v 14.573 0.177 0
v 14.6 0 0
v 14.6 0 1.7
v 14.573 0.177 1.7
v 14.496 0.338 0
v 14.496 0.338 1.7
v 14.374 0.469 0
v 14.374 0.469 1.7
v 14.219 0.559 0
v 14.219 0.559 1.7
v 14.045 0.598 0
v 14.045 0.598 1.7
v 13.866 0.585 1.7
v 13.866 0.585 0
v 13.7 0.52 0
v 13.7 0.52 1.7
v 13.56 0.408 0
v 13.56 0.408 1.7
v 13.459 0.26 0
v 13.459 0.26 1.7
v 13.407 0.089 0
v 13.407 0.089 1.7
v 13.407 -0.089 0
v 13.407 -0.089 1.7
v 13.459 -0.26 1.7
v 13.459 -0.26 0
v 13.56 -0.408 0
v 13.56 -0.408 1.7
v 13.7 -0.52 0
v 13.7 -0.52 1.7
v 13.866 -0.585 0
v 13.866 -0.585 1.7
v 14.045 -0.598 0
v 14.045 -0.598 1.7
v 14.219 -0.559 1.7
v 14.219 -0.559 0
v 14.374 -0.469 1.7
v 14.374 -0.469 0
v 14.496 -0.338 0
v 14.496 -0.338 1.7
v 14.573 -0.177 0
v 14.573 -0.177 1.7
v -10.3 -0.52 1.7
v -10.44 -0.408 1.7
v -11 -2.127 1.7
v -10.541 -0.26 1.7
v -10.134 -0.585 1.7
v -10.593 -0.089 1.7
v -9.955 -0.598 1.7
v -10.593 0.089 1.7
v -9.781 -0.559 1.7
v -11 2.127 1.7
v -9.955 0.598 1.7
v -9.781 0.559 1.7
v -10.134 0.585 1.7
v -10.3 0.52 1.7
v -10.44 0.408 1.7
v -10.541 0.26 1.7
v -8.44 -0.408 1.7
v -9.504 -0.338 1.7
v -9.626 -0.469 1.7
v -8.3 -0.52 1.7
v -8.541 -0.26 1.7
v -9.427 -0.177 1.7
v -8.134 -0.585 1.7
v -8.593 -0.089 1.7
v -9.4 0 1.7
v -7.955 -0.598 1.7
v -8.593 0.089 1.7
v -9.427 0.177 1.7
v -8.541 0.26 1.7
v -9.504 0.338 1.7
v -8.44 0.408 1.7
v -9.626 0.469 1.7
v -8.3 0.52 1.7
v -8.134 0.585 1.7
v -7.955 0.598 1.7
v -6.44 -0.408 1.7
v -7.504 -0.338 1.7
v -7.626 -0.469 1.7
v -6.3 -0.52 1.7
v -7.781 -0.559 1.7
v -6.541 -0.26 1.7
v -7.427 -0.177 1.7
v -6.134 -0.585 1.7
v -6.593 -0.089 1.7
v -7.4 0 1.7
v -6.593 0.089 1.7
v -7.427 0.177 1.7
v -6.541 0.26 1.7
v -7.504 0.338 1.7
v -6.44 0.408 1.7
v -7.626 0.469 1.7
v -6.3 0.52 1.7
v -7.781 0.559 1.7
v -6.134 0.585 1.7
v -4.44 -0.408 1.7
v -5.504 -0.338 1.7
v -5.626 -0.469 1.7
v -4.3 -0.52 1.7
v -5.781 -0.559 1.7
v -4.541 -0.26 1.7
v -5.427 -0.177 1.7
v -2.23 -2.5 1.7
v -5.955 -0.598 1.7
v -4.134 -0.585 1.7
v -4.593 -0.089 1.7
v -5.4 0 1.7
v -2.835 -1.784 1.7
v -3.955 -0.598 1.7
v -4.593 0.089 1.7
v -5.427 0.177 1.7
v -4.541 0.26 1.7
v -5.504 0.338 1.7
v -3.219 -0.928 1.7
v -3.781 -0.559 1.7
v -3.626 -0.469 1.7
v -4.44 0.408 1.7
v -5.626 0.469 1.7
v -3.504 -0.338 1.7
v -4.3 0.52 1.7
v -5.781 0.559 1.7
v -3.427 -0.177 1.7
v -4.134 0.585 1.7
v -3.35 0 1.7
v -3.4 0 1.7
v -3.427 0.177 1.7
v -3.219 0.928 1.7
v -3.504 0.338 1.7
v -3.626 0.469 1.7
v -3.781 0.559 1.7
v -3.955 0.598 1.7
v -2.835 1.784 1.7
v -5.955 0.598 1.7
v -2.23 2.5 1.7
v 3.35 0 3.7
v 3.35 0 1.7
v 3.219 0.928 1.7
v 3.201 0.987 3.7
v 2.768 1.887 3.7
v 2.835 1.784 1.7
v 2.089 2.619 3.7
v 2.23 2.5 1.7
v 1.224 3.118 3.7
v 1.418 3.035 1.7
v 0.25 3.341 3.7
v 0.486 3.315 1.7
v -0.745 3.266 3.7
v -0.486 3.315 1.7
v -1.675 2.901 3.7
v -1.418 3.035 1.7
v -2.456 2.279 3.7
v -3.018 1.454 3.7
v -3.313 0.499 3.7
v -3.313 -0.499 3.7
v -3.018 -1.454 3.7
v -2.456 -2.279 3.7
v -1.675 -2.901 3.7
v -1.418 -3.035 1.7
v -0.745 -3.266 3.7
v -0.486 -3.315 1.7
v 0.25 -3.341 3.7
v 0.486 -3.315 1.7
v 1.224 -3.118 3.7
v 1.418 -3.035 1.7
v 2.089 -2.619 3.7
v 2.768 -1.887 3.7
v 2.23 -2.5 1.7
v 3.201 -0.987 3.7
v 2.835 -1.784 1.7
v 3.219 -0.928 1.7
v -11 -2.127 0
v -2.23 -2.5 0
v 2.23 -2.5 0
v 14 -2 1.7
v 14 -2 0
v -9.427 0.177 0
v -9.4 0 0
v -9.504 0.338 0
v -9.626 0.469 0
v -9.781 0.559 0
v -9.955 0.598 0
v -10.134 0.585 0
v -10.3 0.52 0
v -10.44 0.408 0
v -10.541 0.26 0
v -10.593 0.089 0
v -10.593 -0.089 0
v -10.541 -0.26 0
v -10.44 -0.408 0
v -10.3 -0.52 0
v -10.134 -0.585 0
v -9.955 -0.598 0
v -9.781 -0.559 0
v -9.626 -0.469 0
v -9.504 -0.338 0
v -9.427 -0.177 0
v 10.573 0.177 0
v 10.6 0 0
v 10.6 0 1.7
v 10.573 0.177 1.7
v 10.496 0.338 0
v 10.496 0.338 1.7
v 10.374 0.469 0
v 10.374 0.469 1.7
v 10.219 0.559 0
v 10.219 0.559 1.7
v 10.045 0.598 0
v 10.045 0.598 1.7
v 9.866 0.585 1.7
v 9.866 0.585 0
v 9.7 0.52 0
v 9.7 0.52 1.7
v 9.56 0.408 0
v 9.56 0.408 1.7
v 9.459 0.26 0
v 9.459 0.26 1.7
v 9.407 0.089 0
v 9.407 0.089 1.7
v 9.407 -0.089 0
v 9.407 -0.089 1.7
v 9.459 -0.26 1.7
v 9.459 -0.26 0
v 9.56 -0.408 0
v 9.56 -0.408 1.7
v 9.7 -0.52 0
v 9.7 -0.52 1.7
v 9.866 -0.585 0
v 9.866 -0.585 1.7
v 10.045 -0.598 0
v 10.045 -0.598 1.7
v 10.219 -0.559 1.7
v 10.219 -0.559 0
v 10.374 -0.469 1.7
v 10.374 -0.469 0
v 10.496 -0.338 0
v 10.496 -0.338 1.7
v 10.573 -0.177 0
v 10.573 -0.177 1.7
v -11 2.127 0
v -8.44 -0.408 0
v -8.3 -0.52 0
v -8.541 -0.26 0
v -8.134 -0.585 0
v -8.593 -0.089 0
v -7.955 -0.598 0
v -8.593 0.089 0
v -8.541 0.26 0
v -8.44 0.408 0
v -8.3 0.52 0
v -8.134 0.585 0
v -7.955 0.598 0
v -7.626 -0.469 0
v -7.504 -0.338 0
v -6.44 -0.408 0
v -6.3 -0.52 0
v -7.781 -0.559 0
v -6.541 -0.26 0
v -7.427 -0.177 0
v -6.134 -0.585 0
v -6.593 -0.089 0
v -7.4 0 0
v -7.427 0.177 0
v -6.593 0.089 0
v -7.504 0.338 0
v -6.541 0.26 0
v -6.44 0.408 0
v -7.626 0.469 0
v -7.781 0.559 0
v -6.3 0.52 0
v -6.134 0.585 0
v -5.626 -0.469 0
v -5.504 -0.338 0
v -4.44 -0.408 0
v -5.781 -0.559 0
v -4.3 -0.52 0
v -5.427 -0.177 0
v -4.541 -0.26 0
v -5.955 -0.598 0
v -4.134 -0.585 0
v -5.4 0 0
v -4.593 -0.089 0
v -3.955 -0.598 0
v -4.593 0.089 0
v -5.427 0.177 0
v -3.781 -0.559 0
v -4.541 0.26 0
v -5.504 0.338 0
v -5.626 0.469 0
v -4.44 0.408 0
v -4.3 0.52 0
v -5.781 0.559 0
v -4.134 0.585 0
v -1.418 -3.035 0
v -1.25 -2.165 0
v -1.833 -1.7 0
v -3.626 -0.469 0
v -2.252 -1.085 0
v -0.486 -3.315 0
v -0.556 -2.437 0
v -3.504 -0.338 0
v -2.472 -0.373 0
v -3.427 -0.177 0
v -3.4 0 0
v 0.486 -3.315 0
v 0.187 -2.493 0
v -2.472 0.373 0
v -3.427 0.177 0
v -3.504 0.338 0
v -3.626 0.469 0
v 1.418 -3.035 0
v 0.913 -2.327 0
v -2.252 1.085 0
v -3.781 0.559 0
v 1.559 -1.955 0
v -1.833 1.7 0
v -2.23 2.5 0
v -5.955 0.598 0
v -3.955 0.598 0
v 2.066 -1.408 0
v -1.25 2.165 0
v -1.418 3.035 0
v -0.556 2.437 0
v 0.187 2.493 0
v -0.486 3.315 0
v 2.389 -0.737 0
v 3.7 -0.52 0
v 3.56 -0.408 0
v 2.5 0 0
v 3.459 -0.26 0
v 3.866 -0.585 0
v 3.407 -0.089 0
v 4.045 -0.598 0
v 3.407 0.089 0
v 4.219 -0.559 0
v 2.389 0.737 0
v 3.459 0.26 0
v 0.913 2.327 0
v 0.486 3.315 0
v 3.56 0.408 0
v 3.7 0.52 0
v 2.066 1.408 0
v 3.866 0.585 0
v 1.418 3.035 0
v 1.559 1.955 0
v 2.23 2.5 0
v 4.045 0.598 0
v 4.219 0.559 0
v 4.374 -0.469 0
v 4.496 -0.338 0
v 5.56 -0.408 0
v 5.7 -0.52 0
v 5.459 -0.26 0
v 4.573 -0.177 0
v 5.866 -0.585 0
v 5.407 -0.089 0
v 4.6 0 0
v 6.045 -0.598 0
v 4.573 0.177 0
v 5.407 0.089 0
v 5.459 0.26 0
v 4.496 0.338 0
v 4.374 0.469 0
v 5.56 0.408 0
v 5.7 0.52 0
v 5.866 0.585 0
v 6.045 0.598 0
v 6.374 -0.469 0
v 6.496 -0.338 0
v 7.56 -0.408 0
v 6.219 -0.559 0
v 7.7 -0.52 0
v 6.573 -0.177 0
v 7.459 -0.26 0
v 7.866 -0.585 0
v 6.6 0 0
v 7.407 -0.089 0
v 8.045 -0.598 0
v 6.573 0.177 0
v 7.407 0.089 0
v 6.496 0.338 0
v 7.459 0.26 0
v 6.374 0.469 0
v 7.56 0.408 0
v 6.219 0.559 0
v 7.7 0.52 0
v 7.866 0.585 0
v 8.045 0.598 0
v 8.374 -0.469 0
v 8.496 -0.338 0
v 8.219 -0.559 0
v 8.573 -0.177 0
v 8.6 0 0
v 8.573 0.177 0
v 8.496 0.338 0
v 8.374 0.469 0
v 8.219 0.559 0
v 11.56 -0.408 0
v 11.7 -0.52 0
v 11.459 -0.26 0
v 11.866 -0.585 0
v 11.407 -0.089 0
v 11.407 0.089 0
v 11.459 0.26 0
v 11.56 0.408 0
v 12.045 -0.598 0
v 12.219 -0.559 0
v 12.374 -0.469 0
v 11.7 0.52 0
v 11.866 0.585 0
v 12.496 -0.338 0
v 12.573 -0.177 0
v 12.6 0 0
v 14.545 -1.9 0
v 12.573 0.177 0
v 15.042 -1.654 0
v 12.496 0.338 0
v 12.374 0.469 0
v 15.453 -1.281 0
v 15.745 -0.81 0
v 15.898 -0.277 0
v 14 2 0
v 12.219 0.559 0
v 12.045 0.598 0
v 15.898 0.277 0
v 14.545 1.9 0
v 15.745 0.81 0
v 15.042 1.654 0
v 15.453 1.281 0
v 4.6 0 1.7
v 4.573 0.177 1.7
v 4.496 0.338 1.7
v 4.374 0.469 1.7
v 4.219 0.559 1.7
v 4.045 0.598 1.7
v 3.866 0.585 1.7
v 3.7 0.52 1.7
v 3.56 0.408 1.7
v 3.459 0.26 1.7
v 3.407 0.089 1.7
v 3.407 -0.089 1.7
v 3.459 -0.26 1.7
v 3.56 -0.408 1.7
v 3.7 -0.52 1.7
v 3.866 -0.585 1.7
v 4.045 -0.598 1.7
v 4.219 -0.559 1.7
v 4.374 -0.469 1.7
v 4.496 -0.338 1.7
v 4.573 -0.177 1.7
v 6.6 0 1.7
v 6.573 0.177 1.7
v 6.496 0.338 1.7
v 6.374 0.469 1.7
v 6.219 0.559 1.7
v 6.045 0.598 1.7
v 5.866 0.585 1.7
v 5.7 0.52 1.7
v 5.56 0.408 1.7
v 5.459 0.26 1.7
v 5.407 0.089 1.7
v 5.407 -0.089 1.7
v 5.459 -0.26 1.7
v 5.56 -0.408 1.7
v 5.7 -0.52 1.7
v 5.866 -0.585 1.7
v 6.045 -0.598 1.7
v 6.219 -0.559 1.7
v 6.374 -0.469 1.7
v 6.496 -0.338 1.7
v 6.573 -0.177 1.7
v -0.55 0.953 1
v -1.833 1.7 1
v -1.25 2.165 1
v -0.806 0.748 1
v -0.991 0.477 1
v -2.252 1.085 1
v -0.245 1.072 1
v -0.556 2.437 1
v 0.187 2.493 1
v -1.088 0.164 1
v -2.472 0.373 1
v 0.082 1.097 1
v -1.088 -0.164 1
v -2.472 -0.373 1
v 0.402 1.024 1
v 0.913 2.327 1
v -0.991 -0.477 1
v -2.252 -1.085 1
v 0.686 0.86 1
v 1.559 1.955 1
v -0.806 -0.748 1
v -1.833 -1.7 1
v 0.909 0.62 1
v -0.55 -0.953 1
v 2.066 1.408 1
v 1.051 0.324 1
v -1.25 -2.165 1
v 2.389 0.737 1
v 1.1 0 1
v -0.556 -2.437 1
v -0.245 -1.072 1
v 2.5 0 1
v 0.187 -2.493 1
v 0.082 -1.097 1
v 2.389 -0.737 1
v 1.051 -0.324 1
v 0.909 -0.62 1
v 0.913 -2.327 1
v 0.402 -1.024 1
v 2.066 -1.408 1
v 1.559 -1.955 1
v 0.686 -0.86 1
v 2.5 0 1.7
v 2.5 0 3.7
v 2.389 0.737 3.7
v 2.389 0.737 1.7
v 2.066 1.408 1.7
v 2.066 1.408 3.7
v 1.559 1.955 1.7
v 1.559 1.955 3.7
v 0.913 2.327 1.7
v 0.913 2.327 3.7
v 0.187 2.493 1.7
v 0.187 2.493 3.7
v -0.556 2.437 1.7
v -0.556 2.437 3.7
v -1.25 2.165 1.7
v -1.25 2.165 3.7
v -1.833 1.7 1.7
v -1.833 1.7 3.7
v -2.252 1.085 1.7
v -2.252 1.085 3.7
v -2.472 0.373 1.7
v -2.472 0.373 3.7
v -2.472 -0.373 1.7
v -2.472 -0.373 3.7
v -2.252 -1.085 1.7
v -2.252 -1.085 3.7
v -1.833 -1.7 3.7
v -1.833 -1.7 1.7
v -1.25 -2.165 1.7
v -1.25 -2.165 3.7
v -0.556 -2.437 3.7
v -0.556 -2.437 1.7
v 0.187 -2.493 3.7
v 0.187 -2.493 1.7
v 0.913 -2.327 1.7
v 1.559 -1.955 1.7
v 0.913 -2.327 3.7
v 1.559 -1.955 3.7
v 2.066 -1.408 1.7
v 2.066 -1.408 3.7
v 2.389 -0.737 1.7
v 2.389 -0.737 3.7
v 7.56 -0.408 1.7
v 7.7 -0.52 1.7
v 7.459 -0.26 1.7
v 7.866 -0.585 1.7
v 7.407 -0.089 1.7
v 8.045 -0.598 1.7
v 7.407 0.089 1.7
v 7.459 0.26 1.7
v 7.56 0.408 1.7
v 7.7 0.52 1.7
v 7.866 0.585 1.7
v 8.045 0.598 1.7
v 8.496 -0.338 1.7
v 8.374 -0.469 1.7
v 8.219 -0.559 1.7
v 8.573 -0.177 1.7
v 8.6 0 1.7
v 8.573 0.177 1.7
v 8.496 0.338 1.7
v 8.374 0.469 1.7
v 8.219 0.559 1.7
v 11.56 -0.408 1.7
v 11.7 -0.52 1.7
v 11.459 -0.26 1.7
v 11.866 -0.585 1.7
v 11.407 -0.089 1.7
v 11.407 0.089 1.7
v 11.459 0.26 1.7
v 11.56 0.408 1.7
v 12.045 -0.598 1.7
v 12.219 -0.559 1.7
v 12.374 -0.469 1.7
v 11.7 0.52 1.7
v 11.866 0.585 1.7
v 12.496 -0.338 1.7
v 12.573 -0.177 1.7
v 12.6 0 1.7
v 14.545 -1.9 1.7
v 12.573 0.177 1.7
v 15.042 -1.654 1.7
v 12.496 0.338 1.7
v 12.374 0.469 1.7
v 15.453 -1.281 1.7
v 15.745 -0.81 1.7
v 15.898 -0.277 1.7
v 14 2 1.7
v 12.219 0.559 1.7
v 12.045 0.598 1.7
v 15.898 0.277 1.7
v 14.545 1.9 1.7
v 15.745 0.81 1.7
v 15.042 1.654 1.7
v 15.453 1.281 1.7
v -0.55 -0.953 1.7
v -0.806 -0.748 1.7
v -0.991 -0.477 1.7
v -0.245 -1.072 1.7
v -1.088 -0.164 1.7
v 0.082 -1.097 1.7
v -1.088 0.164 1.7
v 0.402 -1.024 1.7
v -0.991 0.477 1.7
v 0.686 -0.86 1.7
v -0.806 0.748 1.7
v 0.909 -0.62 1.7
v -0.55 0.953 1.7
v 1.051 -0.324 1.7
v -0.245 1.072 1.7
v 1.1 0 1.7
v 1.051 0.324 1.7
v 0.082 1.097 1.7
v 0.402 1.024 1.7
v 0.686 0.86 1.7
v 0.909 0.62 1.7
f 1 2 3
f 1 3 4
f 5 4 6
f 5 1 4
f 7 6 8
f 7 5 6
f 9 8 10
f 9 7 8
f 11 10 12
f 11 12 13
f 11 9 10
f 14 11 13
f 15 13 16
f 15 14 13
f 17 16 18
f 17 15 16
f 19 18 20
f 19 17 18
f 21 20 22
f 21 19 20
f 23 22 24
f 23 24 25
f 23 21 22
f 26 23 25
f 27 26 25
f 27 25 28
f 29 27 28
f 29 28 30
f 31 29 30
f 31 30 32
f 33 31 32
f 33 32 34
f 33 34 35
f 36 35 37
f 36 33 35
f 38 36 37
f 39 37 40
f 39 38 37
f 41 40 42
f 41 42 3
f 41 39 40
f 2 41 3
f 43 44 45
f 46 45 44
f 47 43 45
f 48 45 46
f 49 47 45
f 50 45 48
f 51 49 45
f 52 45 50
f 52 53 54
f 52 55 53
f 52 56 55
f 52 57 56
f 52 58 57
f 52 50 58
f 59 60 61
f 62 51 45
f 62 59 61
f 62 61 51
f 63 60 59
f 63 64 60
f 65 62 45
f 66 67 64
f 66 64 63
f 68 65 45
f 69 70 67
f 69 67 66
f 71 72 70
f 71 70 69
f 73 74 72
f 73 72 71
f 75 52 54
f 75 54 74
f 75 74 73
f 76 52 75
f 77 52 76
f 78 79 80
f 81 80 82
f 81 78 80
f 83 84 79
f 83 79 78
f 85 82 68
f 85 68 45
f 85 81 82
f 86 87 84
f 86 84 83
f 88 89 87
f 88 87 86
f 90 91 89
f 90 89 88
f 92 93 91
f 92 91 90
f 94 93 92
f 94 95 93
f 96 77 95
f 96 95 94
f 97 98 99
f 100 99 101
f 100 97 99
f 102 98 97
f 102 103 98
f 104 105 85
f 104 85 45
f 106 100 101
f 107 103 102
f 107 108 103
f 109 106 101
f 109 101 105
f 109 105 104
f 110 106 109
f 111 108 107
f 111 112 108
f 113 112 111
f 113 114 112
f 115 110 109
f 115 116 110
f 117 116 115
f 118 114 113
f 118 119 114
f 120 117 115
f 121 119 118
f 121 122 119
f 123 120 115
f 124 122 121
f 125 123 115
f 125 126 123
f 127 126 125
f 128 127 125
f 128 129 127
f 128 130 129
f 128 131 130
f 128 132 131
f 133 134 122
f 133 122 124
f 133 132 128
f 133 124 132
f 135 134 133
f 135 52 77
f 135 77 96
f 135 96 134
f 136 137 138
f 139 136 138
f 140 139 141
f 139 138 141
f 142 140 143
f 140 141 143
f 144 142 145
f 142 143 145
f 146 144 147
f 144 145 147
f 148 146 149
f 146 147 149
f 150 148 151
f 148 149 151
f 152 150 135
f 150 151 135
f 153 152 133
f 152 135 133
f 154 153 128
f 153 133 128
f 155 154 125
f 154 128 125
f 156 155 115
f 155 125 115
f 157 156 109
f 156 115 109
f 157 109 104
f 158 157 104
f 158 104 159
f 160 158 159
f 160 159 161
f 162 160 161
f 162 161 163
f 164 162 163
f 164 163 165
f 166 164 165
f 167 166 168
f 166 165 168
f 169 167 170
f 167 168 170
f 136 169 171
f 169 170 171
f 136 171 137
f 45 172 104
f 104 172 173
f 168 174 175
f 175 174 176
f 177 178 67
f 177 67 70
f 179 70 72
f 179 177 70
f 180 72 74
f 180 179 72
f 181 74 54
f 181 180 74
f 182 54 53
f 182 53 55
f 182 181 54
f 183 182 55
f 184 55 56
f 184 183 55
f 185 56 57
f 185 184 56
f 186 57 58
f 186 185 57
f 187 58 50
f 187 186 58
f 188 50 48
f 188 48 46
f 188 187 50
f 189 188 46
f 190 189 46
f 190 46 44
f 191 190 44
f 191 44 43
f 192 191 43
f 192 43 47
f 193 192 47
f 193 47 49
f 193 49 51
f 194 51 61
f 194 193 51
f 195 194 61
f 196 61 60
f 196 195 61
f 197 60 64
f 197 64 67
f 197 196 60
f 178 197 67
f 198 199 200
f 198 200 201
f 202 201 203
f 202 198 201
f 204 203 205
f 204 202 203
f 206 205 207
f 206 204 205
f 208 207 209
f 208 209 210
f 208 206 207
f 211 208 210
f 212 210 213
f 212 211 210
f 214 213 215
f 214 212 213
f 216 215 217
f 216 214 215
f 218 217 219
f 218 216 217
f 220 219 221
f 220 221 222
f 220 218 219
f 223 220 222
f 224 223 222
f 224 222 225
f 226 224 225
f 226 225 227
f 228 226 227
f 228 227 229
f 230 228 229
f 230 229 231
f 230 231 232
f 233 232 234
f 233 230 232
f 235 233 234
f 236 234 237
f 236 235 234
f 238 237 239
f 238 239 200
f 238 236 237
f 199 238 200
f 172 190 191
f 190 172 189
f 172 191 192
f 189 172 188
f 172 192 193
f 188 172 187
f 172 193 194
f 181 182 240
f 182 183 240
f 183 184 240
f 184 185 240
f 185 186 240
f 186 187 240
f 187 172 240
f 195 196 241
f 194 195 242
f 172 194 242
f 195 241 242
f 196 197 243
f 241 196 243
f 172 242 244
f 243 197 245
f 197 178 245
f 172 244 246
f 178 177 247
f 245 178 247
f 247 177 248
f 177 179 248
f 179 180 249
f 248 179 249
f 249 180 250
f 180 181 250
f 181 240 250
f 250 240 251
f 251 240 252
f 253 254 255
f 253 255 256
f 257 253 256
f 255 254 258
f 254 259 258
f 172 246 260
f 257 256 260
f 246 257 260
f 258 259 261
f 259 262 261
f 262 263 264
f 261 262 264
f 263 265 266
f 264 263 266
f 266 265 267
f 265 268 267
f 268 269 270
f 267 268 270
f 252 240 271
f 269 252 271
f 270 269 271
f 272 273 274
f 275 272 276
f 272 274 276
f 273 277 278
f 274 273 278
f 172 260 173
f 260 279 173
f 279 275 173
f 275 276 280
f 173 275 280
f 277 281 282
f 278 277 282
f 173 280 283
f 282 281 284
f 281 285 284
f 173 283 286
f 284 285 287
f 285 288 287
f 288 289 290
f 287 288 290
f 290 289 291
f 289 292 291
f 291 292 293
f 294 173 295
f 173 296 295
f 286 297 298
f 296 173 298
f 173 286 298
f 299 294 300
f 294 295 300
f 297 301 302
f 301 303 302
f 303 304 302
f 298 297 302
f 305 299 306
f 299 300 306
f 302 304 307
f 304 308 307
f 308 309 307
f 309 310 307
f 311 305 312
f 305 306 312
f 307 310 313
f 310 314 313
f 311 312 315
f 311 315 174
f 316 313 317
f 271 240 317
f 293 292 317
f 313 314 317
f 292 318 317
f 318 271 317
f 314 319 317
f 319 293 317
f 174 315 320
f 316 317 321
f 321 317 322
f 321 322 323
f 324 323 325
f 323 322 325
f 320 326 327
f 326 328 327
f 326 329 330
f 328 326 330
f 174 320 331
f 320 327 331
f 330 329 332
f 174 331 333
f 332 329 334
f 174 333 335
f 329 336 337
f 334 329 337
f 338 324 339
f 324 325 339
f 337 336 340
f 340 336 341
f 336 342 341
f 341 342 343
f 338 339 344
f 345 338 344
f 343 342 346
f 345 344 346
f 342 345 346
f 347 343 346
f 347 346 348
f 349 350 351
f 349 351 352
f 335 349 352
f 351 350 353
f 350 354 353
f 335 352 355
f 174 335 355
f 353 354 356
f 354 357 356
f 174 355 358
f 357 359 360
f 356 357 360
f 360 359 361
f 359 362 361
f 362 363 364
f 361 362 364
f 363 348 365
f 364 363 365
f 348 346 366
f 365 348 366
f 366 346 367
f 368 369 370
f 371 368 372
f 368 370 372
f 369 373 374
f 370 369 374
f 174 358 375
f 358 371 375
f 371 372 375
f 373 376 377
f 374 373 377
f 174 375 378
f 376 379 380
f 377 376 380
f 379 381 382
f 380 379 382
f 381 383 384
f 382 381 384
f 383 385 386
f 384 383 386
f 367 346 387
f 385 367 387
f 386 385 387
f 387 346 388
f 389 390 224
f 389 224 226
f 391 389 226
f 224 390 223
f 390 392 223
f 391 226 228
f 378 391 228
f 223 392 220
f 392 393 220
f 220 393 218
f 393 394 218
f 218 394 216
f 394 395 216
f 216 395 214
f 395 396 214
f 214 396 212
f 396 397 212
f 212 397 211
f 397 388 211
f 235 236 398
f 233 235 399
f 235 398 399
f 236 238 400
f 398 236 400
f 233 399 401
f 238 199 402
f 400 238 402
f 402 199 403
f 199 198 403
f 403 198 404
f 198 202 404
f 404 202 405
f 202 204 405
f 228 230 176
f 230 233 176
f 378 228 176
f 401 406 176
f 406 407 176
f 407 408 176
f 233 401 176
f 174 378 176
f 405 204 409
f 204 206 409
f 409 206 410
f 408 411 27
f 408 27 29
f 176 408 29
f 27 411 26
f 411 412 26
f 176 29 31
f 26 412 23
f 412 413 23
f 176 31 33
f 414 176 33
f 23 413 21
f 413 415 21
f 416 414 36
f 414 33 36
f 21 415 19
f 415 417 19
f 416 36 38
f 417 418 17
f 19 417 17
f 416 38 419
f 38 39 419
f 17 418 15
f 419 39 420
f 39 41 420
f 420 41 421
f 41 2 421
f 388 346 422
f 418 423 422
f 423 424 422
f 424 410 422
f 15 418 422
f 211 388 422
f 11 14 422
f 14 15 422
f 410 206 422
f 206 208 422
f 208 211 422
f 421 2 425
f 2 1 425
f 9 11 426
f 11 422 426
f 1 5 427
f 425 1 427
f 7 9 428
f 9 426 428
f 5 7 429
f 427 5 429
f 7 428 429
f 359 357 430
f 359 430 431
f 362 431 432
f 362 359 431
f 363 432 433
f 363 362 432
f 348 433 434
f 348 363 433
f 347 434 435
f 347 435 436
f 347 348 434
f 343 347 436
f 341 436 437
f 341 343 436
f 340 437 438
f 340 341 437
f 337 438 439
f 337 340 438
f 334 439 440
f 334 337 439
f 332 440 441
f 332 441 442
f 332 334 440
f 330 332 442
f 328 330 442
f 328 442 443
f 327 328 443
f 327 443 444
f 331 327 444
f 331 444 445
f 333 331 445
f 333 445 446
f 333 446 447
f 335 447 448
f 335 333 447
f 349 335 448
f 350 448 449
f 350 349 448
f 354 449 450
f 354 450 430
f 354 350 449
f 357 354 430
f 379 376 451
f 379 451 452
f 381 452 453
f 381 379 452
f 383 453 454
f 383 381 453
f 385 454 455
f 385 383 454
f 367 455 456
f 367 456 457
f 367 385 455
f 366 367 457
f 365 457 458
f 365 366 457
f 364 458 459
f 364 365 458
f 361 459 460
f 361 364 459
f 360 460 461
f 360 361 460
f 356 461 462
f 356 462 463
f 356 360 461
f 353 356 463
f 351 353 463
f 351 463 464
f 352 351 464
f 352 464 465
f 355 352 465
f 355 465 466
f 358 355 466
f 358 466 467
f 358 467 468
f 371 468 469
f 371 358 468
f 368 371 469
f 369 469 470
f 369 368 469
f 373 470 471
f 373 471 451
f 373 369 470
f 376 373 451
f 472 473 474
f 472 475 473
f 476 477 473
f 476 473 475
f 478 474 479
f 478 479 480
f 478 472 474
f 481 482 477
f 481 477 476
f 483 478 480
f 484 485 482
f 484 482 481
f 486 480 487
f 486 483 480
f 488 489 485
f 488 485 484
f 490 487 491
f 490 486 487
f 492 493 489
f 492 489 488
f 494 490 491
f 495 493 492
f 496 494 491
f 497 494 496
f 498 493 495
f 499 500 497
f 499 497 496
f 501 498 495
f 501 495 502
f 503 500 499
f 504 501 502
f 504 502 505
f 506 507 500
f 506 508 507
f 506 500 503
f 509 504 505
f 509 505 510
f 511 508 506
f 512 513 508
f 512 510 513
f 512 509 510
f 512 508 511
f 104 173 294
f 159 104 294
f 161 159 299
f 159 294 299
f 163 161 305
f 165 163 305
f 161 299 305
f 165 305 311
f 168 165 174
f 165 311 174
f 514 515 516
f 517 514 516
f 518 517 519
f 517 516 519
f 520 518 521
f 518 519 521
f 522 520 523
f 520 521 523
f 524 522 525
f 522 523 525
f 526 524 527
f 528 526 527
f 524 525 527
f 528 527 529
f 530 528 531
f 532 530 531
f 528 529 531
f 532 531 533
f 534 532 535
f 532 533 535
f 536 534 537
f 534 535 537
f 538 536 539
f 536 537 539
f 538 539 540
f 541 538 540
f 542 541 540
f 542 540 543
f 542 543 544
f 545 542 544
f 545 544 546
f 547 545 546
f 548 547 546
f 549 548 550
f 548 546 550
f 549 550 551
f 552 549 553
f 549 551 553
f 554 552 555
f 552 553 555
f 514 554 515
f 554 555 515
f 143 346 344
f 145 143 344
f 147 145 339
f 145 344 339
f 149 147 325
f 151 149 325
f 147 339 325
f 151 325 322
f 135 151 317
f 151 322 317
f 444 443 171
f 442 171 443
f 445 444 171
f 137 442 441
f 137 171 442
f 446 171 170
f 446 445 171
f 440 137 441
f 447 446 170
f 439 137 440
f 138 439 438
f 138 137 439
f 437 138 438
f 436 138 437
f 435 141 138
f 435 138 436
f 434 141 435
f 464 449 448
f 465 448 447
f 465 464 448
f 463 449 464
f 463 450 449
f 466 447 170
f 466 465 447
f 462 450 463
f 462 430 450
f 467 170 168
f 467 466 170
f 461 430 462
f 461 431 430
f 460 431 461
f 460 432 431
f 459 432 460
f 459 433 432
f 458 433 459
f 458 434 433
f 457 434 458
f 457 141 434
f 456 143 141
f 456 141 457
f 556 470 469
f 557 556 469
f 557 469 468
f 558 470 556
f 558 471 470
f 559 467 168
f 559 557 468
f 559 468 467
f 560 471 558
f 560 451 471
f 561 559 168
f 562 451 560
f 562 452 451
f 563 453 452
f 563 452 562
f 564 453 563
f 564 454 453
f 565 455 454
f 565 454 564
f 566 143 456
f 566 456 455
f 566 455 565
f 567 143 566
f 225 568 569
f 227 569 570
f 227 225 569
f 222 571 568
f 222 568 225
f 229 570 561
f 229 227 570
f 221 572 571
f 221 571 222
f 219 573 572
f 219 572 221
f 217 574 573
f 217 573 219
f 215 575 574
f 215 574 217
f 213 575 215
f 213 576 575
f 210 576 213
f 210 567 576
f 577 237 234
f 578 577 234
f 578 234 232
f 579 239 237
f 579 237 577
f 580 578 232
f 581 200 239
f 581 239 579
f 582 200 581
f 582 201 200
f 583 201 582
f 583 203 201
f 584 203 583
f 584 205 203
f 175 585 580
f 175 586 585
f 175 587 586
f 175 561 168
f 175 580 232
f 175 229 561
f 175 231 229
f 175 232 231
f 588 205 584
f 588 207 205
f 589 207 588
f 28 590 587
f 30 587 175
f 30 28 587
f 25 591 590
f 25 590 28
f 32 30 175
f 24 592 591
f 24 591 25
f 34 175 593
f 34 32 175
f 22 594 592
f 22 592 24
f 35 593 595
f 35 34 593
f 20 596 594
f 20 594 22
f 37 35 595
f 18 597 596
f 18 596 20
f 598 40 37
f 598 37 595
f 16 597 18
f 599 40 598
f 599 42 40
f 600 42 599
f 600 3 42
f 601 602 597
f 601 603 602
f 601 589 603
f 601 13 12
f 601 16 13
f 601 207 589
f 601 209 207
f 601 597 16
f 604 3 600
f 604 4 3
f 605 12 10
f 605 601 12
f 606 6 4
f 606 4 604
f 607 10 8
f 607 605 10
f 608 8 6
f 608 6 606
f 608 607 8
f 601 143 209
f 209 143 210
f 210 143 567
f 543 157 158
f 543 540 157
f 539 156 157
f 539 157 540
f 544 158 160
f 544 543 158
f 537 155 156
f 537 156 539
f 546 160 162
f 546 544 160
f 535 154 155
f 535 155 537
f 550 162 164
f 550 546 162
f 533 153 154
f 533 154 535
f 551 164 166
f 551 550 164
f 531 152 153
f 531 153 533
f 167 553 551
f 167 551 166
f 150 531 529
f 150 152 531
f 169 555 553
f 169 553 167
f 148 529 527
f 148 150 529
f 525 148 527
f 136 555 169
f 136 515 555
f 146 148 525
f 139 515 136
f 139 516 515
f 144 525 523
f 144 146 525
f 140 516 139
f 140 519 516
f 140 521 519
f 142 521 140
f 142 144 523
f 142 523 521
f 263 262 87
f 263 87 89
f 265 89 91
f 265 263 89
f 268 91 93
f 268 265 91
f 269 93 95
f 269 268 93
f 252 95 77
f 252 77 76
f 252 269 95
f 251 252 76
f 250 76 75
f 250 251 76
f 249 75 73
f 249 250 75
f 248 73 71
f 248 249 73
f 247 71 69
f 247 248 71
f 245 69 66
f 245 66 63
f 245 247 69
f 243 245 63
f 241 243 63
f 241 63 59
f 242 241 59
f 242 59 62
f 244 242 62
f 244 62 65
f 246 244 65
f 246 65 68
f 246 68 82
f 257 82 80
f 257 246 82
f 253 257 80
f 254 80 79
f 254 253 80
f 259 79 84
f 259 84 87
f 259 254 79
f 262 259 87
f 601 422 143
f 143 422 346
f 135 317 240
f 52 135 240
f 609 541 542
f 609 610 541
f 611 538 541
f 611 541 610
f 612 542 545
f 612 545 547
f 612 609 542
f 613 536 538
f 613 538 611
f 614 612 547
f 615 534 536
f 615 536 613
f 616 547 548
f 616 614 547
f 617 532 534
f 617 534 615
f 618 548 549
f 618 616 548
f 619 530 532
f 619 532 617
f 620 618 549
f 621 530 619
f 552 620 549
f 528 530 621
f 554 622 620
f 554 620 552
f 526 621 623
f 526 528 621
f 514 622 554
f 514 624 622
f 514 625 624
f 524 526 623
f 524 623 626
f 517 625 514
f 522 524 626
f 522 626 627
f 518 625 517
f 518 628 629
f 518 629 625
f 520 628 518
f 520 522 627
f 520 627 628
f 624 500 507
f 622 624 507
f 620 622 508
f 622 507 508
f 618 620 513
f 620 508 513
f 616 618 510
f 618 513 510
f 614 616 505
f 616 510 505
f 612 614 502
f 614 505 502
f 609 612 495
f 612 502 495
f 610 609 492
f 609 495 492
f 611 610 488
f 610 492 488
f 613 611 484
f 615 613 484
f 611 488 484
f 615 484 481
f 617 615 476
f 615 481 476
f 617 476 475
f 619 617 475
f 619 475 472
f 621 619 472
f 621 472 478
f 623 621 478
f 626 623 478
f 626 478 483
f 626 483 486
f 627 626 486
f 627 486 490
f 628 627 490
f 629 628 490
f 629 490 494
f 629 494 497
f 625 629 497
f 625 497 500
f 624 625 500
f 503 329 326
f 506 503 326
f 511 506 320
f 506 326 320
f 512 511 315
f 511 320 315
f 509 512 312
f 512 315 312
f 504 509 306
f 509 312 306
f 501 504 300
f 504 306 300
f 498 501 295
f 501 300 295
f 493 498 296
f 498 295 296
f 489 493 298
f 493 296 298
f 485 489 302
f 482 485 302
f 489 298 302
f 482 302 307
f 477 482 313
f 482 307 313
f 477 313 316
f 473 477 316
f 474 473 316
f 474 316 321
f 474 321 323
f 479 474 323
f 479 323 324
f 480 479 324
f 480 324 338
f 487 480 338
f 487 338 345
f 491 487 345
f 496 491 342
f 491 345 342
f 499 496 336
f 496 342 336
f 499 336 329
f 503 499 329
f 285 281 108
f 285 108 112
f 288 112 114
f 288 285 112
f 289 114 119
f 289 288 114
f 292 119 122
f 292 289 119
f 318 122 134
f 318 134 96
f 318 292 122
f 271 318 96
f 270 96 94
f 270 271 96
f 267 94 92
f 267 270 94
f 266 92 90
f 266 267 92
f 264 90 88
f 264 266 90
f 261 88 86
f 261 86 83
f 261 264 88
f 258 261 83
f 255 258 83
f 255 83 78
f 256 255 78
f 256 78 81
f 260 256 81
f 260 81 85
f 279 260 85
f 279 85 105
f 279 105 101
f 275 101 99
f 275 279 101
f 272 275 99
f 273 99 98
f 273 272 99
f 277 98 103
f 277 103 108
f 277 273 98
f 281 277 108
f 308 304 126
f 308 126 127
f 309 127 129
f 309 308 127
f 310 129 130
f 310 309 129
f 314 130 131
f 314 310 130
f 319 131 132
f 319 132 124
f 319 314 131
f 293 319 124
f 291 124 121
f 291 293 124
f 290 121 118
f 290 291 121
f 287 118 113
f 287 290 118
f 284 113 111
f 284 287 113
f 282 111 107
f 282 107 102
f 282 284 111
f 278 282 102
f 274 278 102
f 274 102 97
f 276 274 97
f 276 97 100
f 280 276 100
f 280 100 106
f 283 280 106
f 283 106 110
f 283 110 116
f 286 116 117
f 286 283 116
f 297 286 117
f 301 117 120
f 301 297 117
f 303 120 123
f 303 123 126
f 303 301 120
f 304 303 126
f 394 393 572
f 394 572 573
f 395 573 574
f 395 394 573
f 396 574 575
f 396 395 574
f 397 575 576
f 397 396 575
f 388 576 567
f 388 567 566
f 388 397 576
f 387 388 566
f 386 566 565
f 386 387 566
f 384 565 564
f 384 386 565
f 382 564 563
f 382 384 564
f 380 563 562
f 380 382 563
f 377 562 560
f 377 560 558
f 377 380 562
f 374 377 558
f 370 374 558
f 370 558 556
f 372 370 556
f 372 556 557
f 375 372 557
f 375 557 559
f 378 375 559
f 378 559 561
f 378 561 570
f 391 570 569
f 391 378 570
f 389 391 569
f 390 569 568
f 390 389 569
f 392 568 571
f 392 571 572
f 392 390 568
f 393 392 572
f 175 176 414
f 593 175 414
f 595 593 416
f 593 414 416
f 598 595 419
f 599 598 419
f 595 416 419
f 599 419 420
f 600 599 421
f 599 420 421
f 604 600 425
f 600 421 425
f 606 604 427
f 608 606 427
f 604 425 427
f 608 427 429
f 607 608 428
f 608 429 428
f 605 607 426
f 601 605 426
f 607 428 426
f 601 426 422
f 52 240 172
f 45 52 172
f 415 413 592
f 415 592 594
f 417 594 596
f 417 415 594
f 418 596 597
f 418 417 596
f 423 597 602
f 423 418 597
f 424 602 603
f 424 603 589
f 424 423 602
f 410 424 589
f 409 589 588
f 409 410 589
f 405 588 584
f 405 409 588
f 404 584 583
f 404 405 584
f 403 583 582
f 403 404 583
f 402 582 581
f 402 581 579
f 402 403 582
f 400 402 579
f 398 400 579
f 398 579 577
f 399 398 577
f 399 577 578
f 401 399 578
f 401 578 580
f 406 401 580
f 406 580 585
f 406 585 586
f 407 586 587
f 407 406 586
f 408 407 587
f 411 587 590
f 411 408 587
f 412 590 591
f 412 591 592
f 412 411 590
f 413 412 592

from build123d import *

# Parameters (mm, degrees)
F0_R     = 0.6
F1_DEPTH = 1.7
F2_R     = 3.35
F3_DEPTH = 2
F4_R     = 2.5
F5_DEPTH = 1
F6_R     = 1.1
F7_DEPTH = 2.701
F8_R     = 2.5
F9_DEPTH = 2


with BuildPart() as f1:
    # F0 (on Top) → F1 (new body)
    with BuildSketch(Plane.XY):
        with BuildLine():
            ThreePointArc((2.2299103121, -2.5), (3.057180036, -1.369726333), (3.35, 0))
            ThreePointArc((3.35, 0), (3.057180036, 1.369726333), (2.2299103121, 2.5))
            ThreePointArc((2.2299103121, 2.5), (0, 3.35), (-2.2299103121, 2.5))
            ThreePointArc((-2.2299103121, 2.5), (-3.35, 0), (-2.2299103121, -2.5))
            ThreePointArc((-2.2299103121, -2.5), (0, -3.35), (2.2299103121, -2.5))
        make_face()
        with BuildLine():
            ThreePointArc((2.2299103121, 2.5), (3.057180036, 1.369726333), (3.35, 0))
            ThreePointArc((3.35, 0), (3.057180036, -1.369726333), (2.2299103121, -2.5))
            Line((2.2299103121, -2.5), (14, -2))
            ThreePointArc((14, -2), (15.9168426648, 0), (14, 2))
            Line((14, 2), (2.2299103121, 2.5))
        make_face()
        with Locations((4, 0)):
            Circle(F0_R, mode=Mode.SUBTRACT)
        with Locations((6, 0)):
            Circle(F0_R, mode=Mode.SUBTRACT)
        with Locations((8, 0)):
            Circle(F0_R, mode=Mode.SUBTRACT)
        with Locations((10, 0)):
            Circle(F0_R, mode=Mode.SUBTRACT)
        with Locations((12, 0)):
            Circle(F0_R, mode=Mode.SUBTRACT)
        with Locations((14, 0)):
            Circle(F0_R, mode=Mode.SUBTRACT)
        with BuildLine():
            ThreePointArc((-2.2299103121, -2.5), (-3.35, 0), (-2.2299103121, 2.5))
            Line((-2.2299103121, 2.5), (-11, 2.1274416797))
            Line((-11, 2.1274416797), (-11, -2.1274416797))
            Line((-11, -2.1274416797), (-2.2299103121, -2.5))
        make_face()
        with Locations((-10, 0)):
            Circle(F0_R, mode=Mode.SUBTRACT)
        with Locations((-8, 0)):
            Circle(F0_R, mode=Mode.SUBTRACT)
        with Locations((-6, 0)):
            Circle(F0_R, mode=Mode.SUBTRACT)
        with Locations((-4, 0)):
            Circle(F0_R, mode=Mode.SUBTRACT)
    extrude(amount=F1_DEPTH)

    # F2 (on face) → F3 (join)
    with BuildSketch(Plane.XY.offset(1.7)):
        Circle(F2_R)
    extrude(amount=F3_DEPTH)

    # F4 (on face) → F5 (cut)
    with BuildSketch(Plane(origin=(0, 0, 0), x_dir=(1, 0, 0), z_dir=(0, 0, -1))):
        Circle(F4_R)
    extrude(amount=-F5_DEPTH, mode=Mode.SUBTRACT)

    # F6 (on face) → F7 (cut, through all)
    with BuildSketch(Plane(origin=(0, 0, 1), x_dir=(1, 0, 0), z_dir=(0, 0, -1))):
        Circle(F6_R)
    extrude(amount=-F7_DEPTH, mode=Mode.SUBTRACT)

    # F8 (on face) → F9 (cut)
    with BuildSketch(Plane.XY.offset(3.7)):
        Circle(F8_R)
    extrude(amount=-F9_DEPTH, mode=Mode.SUBTRACT)


solid = f1.part
